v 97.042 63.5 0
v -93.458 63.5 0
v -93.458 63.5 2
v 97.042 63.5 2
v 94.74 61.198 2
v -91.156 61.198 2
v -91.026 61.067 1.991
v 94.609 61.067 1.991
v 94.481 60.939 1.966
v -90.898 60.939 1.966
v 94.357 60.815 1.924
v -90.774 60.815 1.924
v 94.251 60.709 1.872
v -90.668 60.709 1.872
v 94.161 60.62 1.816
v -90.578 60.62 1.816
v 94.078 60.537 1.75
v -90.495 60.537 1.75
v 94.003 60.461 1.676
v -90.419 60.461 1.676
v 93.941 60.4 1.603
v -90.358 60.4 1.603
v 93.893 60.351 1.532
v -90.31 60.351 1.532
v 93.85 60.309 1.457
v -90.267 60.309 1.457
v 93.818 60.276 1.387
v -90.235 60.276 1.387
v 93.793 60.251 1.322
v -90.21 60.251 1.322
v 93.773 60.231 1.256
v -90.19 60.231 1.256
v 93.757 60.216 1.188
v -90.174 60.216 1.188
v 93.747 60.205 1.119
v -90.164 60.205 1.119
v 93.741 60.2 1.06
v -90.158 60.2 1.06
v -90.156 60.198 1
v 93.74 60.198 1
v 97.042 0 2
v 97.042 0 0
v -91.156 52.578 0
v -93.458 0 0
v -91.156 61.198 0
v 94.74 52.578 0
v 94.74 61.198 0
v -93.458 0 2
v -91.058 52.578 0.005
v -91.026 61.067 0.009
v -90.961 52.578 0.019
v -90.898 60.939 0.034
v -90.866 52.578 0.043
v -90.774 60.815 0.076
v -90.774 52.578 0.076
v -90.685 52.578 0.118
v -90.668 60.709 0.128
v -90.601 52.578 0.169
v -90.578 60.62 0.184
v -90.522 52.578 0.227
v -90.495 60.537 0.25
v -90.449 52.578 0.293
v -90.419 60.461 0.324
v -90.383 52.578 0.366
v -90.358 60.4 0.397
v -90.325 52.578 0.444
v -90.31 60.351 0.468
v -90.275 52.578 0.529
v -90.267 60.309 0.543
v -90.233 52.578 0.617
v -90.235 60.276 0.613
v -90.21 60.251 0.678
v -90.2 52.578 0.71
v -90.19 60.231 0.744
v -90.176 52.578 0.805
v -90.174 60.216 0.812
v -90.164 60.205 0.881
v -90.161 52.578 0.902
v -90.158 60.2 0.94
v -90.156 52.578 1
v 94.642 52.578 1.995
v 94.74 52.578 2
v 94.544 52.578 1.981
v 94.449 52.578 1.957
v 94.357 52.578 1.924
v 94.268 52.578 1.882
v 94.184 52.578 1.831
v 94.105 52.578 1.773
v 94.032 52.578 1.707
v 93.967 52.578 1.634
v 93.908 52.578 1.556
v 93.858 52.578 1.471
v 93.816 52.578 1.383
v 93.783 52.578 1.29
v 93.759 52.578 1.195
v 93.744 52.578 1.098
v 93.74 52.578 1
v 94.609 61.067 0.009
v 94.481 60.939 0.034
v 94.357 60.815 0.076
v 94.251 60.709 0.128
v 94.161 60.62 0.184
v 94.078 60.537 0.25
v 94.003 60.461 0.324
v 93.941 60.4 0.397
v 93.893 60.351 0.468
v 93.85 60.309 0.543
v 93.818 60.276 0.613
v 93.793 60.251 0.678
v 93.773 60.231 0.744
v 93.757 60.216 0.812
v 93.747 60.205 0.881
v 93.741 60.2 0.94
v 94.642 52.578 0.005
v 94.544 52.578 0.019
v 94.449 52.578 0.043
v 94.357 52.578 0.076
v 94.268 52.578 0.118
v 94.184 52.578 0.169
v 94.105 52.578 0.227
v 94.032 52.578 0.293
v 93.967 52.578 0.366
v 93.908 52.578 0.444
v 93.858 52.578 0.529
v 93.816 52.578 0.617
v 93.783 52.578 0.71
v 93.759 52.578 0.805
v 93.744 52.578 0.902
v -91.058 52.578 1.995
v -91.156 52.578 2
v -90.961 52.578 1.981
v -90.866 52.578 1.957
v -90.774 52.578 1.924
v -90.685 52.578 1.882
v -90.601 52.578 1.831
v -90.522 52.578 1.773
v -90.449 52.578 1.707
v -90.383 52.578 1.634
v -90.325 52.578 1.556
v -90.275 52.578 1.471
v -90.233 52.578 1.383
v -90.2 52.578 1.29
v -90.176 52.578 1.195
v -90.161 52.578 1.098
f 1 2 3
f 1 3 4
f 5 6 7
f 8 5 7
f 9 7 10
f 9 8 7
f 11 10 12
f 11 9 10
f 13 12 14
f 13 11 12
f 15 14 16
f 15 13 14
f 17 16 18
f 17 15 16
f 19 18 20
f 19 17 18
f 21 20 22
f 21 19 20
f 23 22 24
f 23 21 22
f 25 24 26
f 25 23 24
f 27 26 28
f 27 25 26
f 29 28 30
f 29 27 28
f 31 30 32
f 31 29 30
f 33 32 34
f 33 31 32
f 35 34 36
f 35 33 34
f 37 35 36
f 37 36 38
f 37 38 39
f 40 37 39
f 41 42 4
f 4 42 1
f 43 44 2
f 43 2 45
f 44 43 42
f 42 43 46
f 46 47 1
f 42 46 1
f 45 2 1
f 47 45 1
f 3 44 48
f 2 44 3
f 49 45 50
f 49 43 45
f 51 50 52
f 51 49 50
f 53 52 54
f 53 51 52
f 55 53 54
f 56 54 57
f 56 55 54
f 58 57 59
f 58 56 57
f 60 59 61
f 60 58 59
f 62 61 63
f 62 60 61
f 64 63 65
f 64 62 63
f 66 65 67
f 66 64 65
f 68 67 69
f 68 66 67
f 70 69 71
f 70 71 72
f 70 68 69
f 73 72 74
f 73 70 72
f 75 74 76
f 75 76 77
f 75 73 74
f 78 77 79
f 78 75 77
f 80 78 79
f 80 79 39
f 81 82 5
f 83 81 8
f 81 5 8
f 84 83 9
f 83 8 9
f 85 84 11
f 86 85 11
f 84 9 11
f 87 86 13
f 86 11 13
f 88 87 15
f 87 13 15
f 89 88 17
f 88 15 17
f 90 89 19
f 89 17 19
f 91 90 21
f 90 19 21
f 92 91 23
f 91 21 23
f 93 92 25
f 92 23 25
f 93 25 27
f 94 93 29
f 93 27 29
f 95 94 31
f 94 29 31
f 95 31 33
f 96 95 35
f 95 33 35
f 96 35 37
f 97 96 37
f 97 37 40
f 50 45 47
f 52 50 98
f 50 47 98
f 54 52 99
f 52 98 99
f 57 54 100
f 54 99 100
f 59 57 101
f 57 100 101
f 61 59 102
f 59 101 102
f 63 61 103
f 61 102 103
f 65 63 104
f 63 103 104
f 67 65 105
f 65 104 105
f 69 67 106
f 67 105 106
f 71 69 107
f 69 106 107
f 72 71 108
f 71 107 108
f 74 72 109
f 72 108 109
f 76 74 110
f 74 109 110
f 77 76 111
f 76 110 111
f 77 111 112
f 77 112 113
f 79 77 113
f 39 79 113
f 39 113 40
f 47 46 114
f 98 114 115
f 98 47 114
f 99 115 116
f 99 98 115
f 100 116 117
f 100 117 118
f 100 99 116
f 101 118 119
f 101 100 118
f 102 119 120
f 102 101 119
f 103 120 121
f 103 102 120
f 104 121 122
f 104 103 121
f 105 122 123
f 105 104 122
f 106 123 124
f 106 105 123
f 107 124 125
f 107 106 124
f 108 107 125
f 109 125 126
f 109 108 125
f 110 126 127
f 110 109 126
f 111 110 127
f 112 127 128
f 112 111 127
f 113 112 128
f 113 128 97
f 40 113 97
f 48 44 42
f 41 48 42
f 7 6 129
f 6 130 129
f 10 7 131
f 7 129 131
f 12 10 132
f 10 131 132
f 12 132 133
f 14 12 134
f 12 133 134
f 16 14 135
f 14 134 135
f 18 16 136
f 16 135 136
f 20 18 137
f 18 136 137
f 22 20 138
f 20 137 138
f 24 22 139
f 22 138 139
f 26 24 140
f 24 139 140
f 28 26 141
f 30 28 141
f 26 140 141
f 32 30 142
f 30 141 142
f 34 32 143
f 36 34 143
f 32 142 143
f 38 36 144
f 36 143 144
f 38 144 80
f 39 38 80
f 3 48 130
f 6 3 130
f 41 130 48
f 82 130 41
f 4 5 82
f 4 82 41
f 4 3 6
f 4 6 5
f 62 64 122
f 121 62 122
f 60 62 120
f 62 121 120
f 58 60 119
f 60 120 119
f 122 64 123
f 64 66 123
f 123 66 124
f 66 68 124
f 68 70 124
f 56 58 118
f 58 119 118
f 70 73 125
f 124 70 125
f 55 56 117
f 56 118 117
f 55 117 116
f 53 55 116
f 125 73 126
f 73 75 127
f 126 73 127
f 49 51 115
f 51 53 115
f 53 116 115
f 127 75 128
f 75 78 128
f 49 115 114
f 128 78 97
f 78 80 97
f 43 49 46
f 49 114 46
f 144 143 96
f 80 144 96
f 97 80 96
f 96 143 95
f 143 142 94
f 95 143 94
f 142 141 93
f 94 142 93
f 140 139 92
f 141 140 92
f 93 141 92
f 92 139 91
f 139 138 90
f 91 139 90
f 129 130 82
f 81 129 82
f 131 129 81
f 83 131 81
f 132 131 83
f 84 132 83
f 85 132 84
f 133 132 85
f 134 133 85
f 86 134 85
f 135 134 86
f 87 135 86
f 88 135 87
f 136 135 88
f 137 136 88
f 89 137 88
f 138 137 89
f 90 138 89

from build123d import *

# Parameters (mm, degrees)
F0_W     = 190.5
F0_H     = 63.5
F1_DEPTH = 2
F2_W     = 183.896
F2_H     = 7.62
F3_DEPTH = 25.4
F4_R     = 0.99999
F5_R     = 0.99999


# Not quite as in the source:
# - a fillet or chamfer is up to 0.001 mm smaller than in the source, because OpenCascade refuses the exact size


with BuildPart() as f1:
    # F0 (on Top) → F1 (new body)
    with BuildSketch(Plane.XY):
        with Locations((1.791532172, 31.75)):
            Rectangle(F0_W, F0_H)
    extrude(amount=F1_DEPTH)

    # F2 (on face) → F3 (cut)
    with BuildSketch(Plane.XY.offset(2)):
        with Locations((1.791532172, 56.388)):
            Rectangle(F2_W, F2_H)
    extrude(amount=-F3_DEPTH, mode=Mode.SUBTRACT)

    # F4 (radius 1 in the source; OpenCascade refuses exactly that, so slightly less here)
    f4_edges = [f1.edges().sort_by_distance(p)[0] for p in [
        (1.791532, 60.198, 2),
        (1.791532, 60.198, 0),
    ]]
    fillet(f4_edges, radius=F4_R)

    # F5 (radius 1 in the source; OpenCascade refuses exactly that, so slightly less here)
    f5_edges = [f1.edges().sort_by_distance(p)[0] for p in [
        (93.739532, 56.388, 0),
        (93.739532, 56.388, 2),
        (-90.156468, 56.388, 2),
        (-90.156468, 56.388, 0),
    ]]
    fillet(f5_edges, radius=F5_R)


solid = f1.part
